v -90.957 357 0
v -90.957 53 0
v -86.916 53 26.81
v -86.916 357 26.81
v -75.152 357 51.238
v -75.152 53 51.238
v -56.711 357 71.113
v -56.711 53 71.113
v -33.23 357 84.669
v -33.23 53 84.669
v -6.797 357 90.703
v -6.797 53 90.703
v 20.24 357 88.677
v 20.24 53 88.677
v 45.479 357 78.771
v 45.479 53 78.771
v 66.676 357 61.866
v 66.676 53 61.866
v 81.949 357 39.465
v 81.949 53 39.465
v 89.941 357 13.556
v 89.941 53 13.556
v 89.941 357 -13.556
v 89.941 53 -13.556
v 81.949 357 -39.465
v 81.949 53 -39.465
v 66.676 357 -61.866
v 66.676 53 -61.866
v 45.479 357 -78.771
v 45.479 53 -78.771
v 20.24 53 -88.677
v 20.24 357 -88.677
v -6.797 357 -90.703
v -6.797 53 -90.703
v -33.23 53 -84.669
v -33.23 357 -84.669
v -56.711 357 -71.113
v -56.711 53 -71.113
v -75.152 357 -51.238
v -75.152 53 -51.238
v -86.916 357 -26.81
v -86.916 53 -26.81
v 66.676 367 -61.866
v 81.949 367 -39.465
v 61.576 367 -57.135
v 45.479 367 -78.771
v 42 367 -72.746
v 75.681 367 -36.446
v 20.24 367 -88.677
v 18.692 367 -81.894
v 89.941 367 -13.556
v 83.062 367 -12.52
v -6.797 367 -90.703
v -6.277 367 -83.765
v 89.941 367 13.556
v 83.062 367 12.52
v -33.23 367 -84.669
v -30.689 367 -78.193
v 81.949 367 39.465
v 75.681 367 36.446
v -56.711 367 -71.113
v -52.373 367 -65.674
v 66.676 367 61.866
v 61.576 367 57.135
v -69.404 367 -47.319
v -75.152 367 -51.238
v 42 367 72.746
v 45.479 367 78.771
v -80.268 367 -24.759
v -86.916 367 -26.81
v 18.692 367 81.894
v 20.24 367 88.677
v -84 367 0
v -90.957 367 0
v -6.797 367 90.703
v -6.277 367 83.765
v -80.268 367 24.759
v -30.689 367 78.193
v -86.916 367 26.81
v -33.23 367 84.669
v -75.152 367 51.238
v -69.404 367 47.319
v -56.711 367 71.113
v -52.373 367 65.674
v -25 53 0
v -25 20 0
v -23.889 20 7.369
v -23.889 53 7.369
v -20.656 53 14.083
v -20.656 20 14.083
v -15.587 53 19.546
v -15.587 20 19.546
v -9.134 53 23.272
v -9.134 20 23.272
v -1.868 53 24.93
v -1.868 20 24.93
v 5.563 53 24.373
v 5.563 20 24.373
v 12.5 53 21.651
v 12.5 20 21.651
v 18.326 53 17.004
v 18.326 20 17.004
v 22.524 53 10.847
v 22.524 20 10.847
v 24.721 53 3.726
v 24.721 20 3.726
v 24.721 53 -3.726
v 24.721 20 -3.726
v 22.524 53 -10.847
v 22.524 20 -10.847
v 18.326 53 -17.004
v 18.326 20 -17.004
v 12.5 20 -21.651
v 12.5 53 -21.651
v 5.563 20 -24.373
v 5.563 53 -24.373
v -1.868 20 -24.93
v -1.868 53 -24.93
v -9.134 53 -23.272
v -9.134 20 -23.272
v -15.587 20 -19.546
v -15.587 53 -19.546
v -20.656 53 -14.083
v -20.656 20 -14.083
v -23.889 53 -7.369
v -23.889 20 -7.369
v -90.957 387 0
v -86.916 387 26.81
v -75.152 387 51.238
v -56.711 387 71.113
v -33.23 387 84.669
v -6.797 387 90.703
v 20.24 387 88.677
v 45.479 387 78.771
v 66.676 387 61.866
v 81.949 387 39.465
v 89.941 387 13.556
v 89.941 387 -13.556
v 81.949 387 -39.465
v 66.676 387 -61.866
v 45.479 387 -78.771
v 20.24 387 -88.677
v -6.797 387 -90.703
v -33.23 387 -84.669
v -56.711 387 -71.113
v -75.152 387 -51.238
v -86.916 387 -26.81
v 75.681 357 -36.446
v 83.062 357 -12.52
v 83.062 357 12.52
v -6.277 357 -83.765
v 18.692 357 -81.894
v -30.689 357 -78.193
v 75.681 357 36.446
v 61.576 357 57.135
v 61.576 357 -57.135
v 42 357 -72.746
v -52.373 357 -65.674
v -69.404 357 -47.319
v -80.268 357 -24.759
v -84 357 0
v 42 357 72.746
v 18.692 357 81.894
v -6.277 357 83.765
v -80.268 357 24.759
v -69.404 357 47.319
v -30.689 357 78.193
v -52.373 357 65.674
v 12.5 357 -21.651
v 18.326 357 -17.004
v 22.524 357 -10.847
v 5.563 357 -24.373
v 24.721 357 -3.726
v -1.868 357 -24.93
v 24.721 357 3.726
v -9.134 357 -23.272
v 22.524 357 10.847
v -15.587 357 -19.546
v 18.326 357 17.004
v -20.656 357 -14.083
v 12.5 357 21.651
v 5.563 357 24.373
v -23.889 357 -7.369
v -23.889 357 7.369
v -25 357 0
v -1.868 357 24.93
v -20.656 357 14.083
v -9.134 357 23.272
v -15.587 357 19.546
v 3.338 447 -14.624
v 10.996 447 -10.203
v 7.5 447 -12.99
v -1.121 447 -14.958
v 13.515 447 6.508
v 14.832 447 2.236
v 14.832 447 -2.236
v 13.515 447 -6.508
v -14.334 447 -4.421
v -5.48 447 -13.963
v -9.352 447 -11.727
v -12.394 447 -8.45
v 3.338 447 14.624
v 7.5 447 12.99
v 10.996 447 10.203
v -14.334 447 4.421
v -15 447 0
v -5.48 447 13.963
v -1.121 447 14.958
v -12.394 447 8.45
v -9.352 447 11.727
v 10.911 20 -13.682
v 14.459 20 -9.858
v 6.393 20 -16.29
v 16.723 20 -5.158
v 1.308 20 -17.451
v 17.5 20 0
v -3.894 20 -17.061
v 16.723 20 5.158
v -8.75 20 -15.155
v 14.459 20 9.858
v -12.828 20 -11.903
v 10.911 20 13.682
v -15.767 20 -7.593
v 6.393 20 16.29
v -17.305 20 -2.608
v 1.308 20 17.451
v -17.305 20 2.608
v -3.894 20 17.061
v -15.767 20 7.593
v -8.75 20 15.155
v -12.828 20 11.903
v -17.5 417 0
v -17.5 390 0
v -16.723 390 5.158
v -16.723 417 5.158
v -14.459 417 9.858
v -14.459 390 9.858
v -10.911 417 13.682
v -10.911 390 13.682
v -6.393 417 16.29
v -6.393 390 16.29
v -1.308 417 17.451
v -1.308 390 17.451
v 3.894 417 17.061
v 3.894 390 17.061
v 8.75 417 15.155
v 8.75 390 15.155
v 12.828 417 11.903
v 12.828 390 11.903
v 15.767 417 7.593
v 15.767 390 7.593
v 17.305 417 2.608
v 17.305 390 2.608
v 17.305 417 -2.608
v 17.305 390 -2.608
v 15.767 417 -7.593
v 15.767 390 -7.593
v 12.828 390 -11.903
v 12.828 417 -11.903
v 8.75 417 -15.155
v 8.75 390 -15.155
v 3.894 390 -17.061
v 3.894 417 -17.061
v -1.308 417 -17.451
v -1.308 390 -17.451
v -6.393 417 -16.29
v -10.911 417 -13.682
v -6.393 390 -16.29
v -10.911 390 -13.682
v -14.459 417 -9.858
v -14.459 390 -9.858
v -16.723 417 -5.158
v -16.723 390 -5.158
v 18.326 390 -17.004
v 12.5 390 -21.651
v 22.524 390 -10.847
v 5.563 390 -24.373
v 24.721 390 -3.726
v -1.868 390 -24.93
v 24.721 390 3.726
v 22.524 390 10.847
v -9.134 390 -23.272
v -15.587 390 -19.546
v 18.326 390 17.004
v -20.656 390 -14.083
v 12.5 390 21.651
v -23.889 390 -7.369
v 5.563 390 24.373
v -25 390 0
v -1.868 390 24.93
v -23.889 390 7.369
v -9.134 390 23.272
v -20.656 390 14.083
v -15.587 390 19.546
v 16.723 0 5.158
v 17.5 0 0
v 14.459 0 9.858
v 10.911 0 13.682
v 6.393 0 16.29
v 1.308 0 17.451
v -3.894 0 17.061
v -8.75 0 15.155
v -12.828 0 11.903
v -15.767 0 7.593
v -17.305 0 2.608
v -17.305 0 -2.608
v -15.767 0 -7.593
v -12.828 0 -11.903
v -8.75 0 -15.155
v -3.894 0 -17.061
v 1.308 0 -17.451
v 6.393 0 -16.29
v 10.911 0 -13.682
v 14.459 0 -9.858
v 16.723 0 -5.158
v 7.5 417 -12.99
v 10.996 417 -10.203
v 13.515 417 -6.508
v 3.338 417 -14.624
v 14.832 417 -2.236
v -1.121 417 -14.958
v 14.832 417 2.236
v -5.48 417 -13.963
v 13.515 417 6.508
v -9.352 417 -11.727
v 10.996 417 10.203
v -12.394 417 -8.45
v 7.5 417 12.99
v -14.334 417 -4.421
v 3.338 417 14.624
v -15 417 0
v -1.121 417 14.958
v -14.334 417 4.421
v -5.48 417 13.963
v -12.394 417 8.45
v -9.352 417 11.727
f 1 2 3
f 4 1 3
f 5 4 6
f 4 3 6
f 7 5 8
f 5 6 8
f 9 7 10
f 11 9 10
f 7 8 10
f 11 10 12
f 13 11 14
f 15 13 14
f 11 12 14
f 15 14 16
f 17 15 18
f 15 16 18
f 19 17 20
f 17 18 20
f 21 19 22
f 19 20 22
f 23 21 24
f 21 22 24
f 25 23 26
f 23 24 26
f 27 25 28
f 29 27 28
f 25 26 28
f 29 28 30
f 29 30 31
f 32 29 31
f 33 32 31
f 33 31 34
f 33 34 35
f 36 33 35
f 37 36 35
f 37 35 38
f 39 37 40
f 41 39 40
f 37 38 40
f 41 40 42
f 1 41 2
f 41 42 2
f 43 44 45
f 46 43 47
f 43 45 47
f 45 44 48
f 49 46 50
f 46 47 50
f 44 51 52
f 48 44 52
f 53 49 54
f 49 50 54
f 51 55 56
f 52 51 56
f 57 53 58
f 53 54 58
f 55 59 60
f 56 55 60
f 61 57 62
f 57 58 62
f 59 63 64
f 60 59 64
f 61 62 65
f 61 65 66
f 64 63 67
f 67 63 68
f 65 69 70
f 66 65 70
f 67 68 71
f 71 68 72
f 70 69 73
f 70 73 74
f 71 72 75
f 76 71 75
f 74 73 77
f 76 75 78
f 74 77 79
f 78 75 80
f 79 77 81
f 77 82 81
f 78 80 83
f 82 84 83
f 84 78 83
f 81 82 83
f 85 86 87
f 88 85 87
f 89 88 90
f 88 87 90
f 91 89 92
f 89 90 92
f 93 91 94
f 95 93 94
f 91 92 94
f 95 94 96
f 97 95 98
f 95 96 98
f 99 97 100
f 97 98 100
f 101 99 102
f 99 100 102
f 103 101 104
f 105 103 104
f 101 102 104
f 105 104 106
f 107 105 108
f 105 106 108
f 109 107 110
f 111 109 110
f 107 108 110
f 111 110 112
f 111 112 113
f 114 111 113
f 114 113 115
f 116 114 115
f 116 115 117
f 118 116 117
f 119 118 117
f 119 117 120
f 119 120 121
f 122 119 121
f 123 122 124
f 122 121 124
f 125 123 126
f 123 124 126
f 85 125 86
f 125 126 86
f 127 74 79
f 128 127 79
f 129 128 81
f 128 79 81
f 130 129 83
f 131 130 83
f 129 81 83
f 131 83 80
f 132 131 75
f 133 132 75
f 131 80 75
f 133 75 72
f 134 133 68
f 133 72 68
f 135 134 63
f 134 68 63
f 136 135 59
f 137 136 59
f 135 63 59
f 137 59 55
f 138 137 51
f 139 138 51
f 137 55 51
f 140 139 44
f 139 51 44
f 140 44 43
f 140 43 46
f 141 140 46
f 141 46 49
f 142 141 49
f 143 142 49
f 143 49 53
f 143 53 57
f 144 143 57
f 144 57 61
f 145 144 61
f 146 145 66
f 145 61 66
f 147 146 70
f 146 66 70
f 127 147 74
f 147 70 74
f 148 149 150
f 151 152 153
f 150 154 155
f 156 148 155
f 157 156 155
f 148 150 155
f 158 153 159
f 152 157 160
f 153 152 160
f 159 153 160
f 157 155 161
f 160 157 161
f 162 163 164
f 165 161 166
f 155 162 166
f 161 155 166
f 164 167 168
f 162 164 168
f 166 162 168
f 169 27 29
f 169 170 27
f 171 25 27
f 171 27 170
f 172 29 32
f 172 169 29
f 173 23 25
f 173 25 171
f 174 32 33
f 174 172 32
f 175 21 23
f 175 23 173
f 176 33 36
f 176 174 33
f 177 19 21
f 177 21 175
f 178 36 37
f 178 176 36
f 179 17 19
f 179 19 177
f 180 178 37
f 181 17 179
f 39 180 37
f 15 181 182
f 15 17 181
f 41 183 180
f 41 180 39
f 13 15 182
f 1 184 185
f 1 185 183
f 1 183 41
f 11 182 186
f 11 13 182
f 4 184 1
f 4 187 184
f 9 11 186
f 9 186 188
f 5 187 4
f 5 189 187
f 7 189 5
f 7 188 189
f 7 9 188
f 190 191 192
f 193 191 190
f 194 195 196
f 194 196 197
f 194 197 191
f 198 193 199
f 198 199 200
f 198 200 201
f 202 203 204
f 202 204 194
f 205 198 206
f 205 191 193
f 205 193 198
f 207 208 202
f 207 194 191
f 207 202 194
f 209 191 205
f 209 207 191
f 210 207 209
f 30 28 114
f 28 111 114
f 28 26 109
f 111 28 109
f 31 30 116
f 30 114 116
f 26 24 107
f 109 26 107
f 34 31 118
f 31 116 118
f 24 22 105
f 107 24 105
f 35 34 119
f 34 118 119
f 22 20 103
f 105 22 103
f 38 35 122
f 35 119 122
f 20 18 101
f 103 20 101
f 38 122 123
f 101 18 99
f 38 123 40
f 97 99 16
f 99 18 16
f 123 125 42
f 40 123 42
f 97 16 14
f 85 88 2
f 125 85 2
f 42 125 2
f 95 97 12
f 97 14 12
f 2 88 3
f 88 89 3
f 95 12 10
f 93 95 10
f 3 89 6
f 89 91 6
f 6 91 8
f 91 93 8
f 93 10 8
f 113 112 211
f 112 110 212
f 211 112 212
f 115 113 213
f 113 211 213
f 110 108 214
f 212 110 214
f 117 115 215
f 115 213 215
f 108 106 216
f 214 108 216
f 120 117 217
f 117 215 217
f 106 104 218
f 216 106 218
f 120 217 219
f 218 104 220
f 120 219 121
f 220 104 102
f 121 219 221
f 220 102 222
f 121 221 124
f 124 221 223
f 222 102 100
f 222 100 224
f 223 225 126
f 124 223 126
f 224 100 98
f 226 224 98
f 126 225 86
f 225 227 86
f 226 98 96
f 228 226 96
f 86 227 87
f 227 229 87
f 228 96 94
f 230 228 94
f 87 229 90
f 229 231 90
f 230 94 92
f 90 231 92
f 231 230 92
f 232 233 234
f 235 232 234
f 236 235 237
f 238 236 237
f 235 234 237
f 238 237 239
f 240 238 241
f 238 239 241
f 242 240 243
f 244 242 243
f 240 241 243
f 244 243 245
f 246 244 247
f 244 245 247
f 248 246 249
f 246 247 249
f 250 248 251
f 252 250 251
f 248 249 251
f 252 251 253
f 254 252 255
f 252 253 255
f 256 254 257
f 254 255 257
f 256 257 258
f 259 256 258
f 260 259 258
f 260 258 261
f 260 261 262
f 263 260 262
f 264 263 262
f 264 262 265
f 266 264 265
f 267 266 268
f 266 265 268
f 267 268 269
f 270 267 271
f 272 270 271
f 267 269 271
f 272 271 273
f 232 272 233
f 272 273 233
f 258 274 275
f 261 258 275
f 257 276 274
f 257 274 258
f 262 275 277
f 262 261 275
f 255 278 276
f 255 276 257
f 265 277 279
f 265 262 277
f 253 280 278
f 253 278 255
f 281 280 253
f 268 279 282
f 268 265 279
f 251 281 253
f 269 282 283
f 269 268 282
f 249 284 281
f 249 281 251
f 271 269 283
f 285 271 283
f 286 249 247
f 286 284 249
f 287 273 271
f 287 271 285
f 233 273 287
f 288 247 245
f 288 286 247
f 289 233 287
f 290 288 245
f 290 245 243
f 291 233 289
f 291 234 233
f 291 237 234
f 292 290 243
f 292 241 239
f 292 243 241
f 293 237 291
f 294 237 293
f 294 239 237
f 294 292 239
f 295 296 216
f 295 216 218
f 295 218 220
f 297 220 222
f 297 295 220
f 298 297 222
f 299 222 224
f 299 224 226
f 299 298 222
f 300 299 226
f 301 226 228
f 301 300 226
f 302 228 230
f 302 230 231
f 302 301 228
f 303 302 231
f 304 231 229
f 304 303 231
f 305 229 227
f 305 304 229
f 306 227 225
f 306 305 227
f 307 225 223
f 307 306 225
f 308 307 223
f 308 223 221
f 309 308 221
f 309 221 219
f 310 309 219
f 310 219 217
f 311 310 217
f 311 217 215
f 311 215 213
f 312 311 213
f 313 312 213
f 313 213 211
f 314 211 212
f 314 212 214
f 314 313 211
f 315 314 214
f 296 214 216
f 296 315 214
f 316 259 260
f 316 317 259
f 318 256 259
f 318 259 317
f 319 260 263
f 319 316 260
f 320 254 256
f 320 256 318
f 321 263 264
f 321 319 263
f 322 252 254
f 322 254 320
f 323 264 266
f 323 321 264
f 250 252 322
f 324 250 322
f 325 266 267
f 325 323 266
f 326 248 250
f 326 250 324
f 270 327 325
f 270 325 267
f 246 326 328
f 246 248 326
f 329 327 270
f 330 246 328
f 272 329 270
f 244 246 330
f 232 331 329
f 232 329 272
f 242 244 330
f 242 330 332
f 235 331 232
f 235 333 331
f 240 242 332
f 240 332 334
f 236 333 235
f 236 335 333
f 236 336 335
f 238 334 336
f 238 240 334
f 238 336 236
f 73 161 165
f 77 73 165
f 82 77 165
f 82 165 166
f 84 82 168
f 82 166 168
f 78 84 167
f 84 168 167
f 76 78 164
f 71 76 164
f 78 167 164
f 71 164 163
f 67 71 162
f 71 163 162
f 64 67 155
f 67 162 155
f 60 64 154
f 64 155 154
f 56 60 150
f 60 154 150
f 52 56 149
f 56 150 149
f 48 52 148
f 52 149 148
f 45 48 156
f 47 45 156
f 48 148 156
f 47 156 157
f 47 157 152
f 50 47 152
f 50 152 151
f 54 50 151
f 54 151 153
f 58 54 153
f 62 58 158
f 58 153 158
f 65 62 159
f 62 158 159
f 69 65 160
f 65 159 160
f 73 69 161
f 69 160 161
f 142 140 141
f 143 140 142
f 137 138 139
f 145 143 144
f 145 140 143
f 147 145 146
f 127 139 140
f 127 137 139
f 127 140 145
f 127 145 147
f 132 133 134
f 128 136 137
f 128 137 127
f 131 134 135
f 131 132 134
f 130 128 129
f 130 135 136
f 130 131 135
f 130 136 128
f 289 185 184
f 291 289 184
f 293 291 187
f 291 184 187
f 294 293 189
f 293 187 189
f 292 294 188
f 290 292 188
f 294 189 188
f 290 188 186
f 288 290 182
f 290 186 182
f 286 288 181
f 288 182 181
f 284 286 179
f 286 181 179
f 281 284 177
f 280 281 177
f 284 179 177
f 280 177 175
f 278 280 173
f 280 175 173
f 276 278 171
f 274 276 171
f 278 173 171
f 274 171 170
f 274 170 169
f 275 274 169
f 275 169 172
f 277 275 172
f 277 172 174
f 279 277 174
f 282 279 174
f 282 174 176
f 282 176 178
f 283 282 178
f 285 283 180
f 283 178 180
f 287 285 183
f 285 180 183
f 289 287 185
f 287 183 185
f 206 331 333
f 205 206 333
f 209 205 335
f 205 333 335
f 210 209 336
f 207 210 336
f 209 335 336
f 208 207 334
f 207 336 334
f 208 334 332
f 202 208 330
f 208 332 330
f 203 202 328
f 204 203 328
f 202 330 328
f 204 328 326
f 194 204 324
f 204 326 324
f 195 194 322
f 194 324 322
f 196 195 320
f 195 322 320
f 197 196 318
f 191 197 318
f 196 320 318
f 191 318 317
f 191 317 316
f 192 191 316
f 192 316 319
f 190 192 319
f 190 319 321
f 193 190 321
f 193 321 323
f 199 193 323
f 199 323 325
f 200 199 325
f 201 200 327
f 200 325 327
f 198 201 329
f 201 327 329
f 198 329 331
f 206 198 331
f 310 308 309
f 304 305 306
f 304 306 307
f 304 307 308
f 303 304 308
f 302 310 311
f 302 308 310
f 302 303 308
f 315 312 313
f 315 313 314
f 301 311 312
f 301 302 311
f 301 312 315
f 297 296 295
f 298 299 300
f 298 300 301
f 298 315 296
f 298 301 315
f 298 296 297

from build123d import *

# Parameters (mm, degrees)
F0_R      = 17.5
F1_DEPTH  = 20
F2_R      = 25
F2_R_2    = 17.5
F3_DEPTH  = 33
F4_R      = 90.957
F4_R_2    = 25
F5_DEPTH  = 304
F6_R      = 84
F7_DEPTH  = 10
F8_R      = 90.957
F8_R_2    = 84
F9_DEPTH  = 20
F10_R     = 25
F11_DEPTH = 33
F12_R     = 17.5
F13_DEPTH = 27
F14_R     = 15
F15_DEPTH = 30


with BuildPart() as f1:
    # F0 (on Front) → F1 (new body)
    with BuildSketch(Plane.XZ):
        Circle(F0_R)
    extrude(amount=-F1_DEPTH)

    # F2 (on face) → F3 (join)
    with BuildSketch(Plane(origin=(0, 20, 0), x_dir=(-1, 0, 0), z_dir=(0, 1, 0))):
        Circle(F2_R)
        Circle(F2_R_2, mode=Mode.SUBTRACT)
        Circle(F2_R_2)
    extrude(amount=F3_DEPTH)

    # F4 (on face) → F5 (join)
    with BuildSketch(Plane(origin=(0, 53, 0), x_dir=(-1, 0, 0), z_dir=(0, 1, 0))):
        Circle(F4_R)
        Circle(F4_R_2, mode=Mode.SUBTRACT)
        Circle(F4_R_2)
    extrude(amount=F5_DEPTH)

    # F10 (on face) → F11 (join)
    with BuildSketch(Plane(origin=(0, 357, 0), x_dir=(-1, 0, 0), z_dir=(0, 1, 0))):
        Circle(F10_R)
    extrude(amount=F11_DEPTH)

    # F12 (on face) → F13 (join)
    with BuildSketch(Plane(origin=(0, 390, 0), x_dir=(-1, 0, 0), z_dir=(0, 1, 0))):
        Circle(F12_R)
    extrude(amount=F13_DEPTH)

    # F14 (on face) → F15 (join)
    with BuildSketch(Plane(origin=(0, 417, 0), x_dir=(-1, 0, 0), z_dir=(0, 1, 0))):
        Circle(F14_R)
    extrude(amount=F15_DEPTH)


with BuildPart() as f7:
    # F6 (on face) → F7 (new body)
    with BuildSketch(Plane(origin=(0, 357, 0), x_dir=(-1, 0, 0), z_dir=(0, 1, 0))):
        Circle(F6_R)
    extrude(amount=F7_DEPTH)

    # F8 (on face) → F9 (join)
    with BuildSketch(Plane(origin=(0, 367, 0), x_dir=(-1, 0, 0), z_dir=(0, 1, 0))):
        Circle(F8_R)
        Circle(F8_R_2, mode=Mode.SUBTRACT)
        Circle(F8_R_2)
    extrude(amount=F9_DEPTH)


solid = Compound([f1.part, f7.part])
